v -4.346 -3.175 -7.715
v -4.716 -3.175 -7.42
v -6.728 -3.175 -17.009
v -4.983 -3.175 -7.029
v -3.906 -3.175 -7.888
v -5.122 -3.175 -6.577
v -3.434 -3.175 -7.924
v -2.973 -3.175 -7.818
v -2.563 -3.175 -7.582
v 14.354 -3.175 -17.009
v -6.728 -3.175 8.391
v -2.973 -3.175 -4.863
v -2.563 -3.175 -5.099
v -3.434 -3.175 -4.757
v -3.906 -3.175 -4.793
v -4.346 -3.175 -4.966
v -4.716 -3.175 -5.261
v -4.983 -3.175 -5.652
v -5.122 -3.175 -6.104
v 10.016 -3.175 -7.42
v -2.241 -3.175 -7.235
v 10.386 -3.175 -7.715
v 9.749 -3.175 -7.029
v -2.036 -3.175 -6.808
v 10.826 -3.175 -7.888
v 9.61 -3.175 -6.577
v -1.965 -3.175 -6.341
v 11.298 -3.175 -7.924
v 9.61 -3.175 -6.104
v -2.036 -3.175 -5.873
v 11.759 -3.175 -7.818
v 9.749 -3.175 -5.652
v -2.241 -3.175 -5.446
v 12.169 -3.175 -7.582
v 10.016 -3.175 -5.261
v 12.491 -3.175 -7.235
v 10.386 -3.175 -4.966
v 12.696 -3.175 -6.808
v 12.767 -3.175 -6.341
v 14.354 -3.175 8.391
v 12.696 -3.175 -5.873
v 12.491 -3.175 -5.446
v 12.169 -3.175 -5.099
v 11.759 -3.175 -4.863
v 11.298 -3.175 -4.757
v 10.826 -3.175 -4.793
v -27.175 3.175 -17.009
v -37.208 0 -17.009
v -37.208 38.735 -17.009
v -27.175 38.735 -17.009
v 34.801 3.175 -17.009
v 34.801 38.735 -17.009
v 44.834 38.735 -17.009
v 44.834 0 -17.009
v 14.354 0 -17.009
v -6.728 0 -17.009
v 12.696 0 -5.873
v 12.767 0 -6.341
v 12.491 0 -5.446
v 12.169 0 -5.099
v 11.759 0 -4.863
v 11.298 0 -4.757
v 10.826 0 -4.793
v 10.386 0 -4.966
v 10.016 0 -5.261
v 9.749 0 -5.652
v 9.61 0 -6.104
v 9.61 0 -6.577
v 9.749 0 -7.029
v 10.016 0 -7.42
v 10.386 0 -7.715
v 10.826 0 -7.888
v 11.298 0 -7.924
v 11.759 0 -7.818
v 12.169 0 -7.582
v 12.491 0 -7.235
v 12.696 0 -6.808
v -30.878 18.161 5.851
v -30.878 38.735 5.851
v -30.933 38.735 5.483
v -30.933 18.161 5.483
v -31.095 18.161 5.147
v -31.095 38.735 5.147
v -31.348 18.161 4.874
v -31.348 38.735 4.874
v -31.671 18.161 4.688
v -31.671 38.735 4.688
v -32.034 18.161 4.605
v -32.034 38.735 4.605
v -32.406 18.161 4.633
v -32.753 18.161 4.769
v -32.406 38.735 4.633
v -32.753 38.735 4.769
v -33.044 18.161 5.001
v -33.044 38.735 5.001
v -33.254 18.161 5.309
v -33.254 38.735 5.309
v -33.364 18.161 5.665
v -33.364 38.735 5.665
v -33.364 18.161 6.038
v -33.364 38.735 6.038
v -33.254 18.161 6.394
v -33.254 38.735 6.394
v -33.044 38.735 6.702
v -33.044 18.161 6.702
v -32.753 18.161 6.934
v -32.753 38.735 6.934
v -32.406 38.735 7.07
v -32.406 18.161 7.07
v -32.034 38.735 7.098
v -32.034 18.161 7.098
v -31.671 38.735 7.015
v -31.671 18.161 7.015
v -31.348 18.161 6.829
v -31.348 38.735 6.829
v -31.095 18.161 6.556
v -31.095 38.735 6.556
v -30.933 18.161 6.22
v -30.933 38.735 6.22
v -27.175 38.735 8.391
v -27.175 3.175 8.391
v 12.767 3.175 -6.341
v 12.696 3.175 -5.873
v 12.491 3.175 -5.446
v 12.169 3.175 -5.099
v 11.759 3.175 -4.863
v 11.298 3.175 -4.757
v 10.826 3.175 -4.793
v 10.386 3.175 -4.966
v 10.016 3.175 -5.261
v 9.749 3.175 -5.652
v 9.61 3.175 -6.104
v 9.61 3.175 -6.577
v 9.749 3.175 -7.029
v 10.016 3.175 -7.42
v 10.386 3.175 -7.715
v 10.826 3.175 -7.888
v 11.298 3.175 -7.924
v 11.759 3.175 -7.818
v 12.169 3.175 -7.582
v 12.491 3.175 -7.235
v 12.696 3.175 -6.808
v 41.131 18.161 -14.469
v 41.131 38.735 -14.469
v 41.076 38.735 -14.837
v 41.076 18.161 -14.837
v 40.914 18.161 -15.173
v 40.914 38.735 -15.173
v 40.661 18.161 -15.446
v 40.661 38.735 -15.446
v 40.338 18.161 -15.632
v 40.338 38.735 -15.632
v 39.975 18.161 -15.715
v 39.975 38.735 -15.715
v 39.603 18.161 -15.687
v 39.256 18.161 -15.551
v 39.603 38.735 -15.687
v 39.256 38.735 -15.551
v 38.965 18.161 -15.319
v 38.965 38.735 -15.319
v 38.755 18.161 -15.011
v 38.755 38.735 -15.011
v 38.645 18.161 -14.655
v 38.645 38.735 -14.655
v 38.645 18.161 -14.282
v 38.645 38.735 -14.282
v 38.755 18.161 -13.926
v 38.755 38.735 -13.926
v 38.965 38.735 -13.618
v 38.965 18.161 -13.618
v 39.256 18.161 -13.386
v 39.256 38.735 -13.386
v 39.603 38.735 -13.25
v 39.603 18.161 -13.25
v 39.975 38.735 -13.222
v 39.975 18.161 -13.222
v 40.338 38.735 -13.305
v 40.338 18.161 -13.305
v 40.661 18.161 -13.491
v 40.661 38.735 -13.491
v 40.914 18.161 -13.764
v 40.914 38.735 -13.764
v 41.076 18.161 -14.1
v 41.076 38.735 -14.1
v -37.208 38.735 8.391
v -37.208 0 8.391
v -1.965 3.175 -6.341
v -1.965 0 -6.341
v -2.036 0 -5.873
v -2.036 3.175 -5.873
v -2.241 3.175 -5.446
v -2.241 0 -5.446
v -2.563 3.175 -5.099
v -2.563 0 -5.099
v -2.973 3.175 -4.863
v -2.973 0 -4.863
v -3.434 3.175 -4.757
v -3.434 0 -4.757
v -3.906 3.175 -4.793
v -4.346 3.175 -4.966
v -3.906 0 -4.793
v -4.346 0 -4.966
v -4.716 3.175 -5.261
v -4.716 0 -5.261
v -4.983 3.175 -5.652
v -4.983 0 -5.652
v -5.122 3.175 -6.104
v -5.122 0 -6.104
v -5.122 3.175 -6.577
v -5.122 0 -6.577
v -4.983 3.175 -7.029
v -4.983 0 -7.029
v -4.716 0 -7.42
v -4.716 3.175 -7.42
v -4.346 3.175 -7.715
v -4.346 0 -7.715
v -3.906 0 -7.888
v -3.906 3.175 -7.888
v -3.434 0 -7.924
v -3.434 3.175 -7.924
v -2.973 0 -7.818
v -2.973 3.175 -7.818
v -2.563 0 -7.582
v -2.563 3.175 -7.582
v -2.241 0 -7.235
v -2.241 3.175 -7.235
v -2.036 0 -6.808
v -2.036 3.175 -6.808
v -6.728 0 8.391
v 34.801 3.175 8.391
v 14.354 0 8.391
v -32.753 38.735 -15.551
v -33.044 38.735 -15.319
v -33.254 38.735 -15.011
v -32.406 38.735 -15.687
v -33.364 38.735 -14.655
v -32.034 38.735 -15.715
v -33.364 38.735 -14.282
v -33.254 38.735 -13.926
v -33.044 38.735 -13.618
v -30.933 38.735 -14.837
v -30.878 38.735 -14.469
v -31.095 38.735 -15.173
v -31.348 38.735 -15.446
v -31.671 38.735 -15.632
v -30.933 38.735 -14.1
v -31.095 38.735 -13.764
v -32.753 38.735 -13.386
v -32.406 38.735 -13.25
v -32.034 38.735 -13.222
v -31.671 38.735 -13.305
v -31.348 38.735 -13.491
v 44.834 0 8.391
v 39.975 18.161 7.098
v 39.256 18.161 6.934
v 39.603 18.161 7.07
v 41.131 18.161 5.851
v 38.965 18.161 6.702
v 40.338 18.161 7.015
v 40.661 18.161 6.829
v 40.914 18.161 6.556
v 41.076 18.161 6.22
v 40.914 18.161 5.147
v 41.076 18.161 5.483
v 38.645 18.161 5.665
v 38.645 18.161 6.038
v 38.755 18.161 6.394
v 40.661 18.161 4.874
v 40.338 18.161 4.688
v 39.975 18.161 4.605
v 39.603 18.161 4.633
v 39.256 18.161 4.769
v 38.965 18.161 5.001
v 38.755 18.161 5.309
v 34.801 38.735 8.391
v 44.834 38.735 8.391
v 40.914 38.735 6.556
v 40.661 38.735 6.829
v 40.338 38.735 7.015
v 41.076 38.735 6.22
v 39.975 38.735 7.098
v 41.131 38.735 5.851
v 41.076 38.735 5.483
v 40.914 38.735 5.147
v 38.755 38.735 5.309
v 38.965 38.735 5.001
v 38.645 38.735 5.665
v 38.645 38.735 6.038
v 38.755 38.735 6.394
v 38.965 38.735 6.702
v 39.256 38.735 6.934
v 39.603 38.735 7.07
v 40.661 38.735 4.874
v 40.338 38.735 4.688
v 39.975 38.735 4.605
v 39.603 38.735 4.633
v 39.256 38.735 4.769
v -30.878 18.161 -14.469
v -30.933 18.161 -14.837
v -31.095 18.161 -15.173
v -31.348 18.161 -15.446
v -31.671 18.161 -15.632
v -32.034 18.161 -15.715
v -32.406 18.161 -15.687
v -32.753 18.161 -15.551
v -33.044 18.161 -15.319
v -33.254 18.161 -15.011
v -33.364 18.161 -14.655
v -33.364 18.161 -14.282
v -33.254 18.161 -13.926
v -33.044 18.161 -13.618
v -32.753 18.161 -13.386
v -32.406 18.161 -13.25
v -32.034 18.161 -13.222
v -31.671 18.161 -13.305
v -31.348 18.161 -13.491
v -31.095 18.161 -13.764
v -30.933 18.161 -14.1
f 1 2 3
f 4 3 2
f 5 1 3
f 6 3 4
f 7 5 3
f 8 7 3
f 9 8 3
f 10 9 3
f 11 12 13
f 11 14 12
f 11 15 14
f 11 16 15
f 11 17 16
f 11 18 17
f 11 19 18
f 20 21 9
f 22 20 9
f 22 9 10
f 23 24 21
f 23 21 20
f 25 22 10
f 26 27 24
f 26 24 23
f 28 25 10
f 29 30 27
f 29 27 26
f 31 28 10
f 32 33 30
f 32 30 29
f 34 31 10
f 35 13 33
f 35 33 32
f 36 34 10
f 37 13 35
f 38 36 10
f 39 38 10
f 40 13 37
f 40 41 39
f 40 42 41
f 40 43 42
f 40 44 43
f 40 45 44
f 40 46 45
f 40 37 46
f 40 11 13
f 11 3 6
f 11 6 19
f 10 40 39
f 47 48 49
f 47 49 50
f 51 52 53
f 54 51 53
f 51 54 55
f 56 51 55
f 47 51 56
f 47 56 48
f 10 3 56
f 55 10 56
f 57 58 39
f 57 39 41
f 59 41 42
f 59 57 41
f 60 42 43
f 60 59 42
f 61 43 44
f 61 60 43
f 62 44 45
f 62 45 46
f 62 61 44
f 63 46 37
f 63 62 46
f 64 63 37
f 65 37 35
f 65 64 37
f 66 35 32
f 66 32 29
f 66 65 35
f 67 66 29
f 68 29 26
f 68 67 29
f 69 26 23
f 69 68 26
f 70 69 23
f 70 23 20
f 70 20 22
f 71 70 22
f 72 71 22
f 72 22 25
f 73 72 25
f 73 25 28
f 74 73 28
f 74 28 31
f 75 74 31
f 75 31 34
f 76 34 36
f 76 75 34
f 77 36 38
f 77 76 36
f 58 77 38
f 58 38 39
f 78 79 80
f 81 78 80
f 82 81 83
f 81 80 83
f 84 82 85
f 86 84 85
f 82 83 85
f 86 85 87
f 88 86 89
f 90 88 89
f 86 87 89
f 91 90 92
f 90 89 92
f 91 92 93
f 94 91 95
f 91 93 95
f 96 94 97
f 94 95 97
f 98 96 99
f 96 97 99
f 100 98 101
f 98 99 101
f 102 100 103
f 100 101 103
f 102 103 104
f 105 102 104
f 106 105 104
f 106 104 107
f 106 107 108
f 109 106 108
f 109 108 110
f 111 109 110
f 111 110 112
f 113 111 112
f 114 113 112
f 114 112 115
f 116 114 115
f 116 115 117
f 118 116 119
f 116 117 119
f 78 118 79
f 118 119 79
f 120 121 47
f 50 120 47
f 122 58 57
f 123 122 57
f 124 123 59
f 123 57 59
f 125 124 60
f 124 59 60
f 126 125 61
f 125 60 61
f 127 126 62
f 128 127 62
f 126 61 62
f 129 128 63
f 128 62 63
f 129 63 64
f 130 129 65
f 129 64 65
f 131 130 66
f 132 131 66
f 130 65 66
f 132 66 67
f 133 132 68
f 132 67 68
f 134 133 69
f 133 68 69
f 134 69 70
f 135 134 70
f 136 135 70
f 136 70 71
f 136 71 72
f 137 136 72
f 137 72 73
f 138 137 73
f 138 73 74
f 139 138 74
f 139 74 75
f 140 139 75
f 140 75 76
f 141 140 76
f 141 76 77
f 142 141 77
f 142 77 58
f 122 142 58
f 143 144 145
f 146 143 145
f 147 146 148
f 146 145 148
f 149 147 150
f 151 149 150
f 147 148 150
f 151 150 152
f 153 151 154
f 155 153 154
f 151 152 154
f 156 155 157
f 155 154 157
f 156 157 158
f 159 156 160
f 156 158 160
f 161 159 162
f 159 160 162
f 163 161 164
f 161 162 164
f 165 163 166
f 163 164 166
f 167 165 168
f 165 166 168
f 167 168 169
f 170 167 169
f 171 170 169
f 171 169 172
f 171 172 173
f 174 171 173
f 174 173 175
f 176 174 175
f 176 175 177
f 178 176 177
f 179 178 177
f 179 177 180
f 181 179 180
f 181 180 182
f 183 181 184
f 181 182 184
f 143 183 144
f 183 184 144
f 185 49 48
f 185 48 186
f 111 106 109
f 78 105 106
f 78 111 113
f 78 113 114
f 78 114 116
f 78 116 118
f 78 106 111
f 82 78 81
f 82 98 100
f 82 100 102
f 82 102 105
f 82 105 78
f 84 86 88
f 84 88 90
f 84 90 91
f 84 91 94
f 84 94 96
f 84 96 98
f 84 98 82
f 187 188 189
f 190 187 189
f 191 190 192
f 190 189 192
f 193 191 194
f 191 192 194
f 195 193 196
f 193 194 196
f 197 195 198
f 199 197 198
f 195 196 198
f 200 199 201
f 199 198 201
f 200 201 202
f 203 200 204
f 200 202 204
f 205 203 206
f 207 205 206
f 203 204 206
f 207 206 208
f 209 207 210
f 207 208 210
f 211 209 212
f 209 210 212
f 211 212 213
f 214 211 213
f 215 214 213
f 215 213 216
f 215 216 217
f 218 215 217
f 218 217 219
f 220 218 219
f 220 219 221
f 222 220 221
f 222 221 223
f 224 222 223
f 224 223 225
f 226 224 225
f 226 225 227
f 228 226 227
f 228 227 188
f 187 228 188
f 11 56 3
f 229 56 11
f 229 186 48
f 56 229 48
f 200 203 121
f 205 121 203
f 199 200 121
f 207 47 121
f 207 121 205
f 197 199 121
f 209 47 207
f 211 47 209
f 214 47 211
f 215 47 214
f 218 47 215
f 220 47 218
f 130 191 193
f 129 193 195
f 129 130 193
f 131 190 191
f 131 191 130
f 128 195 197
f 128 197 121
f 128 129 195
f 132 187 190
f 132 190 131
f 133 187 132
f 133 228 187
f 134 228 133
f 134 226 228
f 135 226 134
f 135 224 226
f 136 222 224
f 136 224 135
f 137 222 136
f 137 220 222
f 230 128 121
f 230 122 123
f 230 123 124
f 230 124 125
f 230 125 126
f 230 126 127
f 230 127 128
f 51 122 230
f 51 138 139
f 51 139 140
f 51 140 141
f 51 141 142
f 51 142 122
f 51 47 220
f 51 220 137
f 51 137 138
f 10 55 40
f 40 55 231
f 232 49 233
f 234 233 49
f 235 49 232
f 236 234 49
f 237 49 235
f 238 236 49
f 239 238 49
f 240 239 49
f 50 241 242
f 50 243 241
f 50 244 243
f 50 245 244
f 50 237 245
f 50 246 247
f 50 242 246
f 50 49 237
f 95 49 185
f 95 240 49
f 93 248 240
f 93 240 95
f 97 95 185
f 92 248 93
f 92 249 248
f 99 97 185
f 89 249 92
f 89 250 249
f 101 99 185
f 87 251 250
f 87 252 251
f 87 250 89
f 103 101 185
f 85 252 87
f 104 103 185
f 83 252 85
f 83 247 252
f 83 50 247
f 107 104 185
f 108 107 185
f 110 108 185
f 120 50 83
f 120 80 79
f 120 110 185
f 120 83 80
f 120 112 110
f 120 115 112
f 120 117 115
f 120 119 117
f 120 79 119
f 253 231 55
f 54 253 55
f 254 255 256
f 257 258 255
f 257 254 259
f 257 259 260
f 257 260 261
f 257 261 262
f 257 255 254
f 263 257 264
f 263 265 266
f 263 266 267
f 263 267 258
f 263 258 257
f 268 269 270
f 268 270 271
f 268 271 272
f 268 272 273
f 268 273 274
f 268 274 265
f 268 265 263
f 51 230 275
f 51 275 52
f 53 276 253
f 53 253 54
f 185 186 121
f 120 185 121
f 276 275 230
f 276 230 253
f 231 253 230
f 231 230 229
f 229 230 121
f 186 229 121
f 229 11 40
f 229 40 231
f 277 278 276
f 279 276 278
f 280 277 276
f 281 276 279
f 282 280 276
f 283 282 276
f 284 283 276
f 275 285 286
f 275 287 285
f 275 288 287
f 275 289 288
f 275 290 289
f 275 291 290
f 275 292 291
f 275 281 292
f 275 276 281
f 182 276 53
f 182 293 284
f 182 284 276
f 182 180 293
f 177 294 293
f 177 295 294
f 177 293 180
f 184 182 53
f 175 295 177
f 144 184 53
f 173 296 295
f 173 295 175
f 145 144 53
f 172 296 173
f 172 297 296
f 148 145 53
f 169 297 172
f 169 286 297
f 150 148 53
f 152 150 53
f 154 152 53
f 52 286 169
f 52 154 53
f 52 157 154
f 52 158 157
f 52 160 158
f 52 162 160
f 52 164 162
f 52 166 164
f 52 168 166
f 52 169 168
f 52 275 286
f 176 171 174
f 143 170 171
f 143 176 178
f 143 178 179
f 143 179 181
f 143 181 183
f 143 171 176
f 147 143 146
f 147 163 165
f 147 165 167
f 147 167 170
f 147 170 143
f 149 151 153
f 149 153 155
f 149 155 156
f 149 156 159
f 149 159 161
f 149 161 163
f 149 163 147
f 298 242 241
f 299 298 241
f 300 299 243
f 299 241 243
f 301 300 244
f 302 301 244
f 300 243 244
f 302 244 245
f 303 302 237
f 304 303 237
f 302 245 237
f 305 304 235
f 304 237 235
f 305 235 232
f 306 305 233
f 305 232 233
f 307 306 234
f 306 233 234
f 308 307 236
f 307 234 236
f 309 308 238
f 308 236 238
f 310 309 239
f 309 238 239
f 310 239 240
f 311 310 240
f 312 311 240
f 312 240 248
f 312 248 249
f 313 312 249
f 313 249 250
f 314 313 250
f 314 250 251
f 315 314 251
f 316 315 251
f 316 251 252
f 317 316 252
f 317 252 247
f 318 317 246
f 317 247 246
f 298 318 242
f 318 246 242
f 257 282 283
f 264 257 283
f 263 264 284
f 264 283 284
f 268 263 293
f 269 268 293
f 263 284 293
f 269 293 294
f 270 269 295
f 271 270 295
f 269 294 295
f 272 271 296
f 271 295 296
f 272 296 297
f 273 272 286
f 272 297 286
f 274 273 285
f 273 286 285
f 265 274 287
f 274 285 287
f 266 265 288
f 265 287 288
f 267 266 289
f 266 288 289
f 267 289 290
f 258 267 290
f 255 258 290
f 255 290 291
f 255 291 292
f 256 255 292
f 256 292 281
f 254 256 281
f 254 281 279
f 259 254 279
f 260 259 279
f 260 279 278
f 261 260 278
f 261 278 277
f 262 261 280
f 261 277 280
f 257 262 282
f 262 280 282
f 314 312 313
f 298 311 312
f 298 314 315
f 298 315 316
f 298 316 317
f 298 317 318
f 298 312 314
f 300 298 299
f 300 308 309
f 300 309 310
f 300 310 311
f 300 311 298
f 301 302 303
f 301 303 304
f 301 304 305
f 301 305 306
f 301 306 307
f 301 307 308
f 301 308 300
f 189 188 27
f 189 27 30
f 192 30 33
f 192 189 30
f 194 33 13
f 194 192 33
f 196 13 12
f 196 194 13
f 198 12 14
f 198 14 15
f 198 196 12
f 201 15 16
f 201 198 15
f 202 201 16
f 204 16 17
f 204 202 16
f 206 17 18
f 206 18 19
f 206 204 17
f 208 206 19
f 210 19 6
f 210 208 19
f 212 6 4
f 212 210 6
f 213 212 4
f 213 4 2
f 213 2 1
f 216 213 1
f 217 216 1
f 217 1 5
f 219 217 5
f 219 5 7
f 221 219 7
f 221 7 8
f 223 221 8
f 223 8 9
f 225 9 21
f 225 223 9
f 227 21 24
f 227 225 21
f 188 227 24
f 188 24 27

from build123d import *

# Parameters (mm, degrees)
SKETCH1_W           = 69.85
SKETCH1_H           = 25.4
BOSS_EXTRUDE1_DEPTH = 3.175
SKETCH2_W           = 3.937
SKETCH2_H           = 25.4
BOSS_EXTRUDE2_DEPTH = 35.56
SKETCH6_R           = 1.5875
CUT_EXTRUDE1_DEPTH  = 35.56
SKETCH10_W          = 25.4
SKETCH10_H          = 38.735
BOSS_EXTRUDE3_DEPTH = 6.096
SKETCH11_W          = 25.4
SKETCH11_H          = 38.735
BOSS_EXTRUDE4_DEPTH = 6.096
SKETCH14_R          = 1.25
CUT_EXTRUDE2_DEPTH  = 20.574
SKETCH15_W          = 21.082
SKETCH15_H          = 25.4
SKETCH15_R          = 1.5875
BOSS_EXTRUDE6_DEPTH = 3.175


with BuildPart() as part:
    # Sketch1 → Boss-Extrude1 (new body)
    with BuildSketch(Plane(origin=(0, 0, 0), x_dir=(1, 0, 0), z_dir=(0, 1, 0))):
        with Locations((3.81330156, 4.308535529)):
            Rectangle(SKETCH1_W, SKETCH1_H)
    extrude(amount=BOSS_EXTRUDE1_DEPTH)

    # Sketch2 → Boss-Extrude2 (add)
    with BuildSketch(Plane(origin=(0, 3.175, 0), x_dir=(1, 0, 0), z_dir=(0, 1, 0))):
        with Locations((-29.14319844, 4.308535529)):
            Rectangle(SKETCH2_W, SKETCH2_H)
        with Locations((36.76980156, 4.308535529)):
            Rectangle(SKETCH2_W, SKETCH2_H)
    extrude(amount=BOSS_EXTRUDE2_DEPTH)

    # Sketch6 → Cut-Extrude1 (cut)
    with BuildSketch(Plane.XZ):
        with Locations((-3.55269844, -6.340535529)):
            Circle(SKETCH6_R)
        with Locations((11.17930156, -6.340535529)):
            Circle(SKETCH6_R)
    extrude(amount=-CUT_EXTRUDE1_DEPTH, mode=Mode.SUBTRACT)

    # Sketch10 → Boss-Extrude3 (add)
    with BuildSketch(Plane.ZY.offset(31.11169844)):
        with Locations((-4.308535529, 19.3675)):
            Rectangle(SKETCH10_W, SKETCH10_H)
    extrude(amount=BOSS_EXTRUDE3_DEPTH)

    # Sketch11 → Boss-Extrude4 (add)
    with BuildSketch(Plane(origin=(38.73830156, 0, 0), x_dir=(0, 0, -1), z_dir=(1, 0, 0))):
        with Locations((4.308535529, 19.3675)):
            Rectangle(SKETCH11_W, SKETCH11_H)
    extrude(amount=BOSS_EXTRUDE4_DEPTH)

    # Sketch14 → Cut-Extrude2 (cut)
    with BuildSketch(Plane(origin=(0, 38.735, 0), x_dir=(1, 0, 0), z_dir=(0, 1, 0))):
        with Locations((-32.12769844, 14.468535529)):
            Circle(SKETCH14_R)
        with Locations((-32.12769844, -5.851464471)):
            Circle(SKETCH14_R)
        with Locations((39.88130156, 14.468535529)):
            Circle(SKETCH14_R)
        with Locations((39.88130156, -5.851464471)):
            Circle(SKETCH14_R)
    extrude(amount=-CUT_EXTRUDE2_DEPTH, mode=Mode.SUBTRACT)

    # Sketch15 → Boss-Extrude6 (add)
    with BuildSketch(Plane.XZ):
        with Locations((3.81330156, -4.308535529)):
            Rectangle(SKETCH15_W, SKETCH15_H)
        with Locations((-3.55269844, -6.340535529)):
            Circle(SKETCH15_R, mode=Mode.SUBTRACT)
        with Locations((11.17930156, -6.340535529)):
            Circle(SKETCH15_R, mode=Mode.SUBTRACT)
    extrude(amount=BOSS_EXTRUDE6_DEPTH)


solid = part.part
